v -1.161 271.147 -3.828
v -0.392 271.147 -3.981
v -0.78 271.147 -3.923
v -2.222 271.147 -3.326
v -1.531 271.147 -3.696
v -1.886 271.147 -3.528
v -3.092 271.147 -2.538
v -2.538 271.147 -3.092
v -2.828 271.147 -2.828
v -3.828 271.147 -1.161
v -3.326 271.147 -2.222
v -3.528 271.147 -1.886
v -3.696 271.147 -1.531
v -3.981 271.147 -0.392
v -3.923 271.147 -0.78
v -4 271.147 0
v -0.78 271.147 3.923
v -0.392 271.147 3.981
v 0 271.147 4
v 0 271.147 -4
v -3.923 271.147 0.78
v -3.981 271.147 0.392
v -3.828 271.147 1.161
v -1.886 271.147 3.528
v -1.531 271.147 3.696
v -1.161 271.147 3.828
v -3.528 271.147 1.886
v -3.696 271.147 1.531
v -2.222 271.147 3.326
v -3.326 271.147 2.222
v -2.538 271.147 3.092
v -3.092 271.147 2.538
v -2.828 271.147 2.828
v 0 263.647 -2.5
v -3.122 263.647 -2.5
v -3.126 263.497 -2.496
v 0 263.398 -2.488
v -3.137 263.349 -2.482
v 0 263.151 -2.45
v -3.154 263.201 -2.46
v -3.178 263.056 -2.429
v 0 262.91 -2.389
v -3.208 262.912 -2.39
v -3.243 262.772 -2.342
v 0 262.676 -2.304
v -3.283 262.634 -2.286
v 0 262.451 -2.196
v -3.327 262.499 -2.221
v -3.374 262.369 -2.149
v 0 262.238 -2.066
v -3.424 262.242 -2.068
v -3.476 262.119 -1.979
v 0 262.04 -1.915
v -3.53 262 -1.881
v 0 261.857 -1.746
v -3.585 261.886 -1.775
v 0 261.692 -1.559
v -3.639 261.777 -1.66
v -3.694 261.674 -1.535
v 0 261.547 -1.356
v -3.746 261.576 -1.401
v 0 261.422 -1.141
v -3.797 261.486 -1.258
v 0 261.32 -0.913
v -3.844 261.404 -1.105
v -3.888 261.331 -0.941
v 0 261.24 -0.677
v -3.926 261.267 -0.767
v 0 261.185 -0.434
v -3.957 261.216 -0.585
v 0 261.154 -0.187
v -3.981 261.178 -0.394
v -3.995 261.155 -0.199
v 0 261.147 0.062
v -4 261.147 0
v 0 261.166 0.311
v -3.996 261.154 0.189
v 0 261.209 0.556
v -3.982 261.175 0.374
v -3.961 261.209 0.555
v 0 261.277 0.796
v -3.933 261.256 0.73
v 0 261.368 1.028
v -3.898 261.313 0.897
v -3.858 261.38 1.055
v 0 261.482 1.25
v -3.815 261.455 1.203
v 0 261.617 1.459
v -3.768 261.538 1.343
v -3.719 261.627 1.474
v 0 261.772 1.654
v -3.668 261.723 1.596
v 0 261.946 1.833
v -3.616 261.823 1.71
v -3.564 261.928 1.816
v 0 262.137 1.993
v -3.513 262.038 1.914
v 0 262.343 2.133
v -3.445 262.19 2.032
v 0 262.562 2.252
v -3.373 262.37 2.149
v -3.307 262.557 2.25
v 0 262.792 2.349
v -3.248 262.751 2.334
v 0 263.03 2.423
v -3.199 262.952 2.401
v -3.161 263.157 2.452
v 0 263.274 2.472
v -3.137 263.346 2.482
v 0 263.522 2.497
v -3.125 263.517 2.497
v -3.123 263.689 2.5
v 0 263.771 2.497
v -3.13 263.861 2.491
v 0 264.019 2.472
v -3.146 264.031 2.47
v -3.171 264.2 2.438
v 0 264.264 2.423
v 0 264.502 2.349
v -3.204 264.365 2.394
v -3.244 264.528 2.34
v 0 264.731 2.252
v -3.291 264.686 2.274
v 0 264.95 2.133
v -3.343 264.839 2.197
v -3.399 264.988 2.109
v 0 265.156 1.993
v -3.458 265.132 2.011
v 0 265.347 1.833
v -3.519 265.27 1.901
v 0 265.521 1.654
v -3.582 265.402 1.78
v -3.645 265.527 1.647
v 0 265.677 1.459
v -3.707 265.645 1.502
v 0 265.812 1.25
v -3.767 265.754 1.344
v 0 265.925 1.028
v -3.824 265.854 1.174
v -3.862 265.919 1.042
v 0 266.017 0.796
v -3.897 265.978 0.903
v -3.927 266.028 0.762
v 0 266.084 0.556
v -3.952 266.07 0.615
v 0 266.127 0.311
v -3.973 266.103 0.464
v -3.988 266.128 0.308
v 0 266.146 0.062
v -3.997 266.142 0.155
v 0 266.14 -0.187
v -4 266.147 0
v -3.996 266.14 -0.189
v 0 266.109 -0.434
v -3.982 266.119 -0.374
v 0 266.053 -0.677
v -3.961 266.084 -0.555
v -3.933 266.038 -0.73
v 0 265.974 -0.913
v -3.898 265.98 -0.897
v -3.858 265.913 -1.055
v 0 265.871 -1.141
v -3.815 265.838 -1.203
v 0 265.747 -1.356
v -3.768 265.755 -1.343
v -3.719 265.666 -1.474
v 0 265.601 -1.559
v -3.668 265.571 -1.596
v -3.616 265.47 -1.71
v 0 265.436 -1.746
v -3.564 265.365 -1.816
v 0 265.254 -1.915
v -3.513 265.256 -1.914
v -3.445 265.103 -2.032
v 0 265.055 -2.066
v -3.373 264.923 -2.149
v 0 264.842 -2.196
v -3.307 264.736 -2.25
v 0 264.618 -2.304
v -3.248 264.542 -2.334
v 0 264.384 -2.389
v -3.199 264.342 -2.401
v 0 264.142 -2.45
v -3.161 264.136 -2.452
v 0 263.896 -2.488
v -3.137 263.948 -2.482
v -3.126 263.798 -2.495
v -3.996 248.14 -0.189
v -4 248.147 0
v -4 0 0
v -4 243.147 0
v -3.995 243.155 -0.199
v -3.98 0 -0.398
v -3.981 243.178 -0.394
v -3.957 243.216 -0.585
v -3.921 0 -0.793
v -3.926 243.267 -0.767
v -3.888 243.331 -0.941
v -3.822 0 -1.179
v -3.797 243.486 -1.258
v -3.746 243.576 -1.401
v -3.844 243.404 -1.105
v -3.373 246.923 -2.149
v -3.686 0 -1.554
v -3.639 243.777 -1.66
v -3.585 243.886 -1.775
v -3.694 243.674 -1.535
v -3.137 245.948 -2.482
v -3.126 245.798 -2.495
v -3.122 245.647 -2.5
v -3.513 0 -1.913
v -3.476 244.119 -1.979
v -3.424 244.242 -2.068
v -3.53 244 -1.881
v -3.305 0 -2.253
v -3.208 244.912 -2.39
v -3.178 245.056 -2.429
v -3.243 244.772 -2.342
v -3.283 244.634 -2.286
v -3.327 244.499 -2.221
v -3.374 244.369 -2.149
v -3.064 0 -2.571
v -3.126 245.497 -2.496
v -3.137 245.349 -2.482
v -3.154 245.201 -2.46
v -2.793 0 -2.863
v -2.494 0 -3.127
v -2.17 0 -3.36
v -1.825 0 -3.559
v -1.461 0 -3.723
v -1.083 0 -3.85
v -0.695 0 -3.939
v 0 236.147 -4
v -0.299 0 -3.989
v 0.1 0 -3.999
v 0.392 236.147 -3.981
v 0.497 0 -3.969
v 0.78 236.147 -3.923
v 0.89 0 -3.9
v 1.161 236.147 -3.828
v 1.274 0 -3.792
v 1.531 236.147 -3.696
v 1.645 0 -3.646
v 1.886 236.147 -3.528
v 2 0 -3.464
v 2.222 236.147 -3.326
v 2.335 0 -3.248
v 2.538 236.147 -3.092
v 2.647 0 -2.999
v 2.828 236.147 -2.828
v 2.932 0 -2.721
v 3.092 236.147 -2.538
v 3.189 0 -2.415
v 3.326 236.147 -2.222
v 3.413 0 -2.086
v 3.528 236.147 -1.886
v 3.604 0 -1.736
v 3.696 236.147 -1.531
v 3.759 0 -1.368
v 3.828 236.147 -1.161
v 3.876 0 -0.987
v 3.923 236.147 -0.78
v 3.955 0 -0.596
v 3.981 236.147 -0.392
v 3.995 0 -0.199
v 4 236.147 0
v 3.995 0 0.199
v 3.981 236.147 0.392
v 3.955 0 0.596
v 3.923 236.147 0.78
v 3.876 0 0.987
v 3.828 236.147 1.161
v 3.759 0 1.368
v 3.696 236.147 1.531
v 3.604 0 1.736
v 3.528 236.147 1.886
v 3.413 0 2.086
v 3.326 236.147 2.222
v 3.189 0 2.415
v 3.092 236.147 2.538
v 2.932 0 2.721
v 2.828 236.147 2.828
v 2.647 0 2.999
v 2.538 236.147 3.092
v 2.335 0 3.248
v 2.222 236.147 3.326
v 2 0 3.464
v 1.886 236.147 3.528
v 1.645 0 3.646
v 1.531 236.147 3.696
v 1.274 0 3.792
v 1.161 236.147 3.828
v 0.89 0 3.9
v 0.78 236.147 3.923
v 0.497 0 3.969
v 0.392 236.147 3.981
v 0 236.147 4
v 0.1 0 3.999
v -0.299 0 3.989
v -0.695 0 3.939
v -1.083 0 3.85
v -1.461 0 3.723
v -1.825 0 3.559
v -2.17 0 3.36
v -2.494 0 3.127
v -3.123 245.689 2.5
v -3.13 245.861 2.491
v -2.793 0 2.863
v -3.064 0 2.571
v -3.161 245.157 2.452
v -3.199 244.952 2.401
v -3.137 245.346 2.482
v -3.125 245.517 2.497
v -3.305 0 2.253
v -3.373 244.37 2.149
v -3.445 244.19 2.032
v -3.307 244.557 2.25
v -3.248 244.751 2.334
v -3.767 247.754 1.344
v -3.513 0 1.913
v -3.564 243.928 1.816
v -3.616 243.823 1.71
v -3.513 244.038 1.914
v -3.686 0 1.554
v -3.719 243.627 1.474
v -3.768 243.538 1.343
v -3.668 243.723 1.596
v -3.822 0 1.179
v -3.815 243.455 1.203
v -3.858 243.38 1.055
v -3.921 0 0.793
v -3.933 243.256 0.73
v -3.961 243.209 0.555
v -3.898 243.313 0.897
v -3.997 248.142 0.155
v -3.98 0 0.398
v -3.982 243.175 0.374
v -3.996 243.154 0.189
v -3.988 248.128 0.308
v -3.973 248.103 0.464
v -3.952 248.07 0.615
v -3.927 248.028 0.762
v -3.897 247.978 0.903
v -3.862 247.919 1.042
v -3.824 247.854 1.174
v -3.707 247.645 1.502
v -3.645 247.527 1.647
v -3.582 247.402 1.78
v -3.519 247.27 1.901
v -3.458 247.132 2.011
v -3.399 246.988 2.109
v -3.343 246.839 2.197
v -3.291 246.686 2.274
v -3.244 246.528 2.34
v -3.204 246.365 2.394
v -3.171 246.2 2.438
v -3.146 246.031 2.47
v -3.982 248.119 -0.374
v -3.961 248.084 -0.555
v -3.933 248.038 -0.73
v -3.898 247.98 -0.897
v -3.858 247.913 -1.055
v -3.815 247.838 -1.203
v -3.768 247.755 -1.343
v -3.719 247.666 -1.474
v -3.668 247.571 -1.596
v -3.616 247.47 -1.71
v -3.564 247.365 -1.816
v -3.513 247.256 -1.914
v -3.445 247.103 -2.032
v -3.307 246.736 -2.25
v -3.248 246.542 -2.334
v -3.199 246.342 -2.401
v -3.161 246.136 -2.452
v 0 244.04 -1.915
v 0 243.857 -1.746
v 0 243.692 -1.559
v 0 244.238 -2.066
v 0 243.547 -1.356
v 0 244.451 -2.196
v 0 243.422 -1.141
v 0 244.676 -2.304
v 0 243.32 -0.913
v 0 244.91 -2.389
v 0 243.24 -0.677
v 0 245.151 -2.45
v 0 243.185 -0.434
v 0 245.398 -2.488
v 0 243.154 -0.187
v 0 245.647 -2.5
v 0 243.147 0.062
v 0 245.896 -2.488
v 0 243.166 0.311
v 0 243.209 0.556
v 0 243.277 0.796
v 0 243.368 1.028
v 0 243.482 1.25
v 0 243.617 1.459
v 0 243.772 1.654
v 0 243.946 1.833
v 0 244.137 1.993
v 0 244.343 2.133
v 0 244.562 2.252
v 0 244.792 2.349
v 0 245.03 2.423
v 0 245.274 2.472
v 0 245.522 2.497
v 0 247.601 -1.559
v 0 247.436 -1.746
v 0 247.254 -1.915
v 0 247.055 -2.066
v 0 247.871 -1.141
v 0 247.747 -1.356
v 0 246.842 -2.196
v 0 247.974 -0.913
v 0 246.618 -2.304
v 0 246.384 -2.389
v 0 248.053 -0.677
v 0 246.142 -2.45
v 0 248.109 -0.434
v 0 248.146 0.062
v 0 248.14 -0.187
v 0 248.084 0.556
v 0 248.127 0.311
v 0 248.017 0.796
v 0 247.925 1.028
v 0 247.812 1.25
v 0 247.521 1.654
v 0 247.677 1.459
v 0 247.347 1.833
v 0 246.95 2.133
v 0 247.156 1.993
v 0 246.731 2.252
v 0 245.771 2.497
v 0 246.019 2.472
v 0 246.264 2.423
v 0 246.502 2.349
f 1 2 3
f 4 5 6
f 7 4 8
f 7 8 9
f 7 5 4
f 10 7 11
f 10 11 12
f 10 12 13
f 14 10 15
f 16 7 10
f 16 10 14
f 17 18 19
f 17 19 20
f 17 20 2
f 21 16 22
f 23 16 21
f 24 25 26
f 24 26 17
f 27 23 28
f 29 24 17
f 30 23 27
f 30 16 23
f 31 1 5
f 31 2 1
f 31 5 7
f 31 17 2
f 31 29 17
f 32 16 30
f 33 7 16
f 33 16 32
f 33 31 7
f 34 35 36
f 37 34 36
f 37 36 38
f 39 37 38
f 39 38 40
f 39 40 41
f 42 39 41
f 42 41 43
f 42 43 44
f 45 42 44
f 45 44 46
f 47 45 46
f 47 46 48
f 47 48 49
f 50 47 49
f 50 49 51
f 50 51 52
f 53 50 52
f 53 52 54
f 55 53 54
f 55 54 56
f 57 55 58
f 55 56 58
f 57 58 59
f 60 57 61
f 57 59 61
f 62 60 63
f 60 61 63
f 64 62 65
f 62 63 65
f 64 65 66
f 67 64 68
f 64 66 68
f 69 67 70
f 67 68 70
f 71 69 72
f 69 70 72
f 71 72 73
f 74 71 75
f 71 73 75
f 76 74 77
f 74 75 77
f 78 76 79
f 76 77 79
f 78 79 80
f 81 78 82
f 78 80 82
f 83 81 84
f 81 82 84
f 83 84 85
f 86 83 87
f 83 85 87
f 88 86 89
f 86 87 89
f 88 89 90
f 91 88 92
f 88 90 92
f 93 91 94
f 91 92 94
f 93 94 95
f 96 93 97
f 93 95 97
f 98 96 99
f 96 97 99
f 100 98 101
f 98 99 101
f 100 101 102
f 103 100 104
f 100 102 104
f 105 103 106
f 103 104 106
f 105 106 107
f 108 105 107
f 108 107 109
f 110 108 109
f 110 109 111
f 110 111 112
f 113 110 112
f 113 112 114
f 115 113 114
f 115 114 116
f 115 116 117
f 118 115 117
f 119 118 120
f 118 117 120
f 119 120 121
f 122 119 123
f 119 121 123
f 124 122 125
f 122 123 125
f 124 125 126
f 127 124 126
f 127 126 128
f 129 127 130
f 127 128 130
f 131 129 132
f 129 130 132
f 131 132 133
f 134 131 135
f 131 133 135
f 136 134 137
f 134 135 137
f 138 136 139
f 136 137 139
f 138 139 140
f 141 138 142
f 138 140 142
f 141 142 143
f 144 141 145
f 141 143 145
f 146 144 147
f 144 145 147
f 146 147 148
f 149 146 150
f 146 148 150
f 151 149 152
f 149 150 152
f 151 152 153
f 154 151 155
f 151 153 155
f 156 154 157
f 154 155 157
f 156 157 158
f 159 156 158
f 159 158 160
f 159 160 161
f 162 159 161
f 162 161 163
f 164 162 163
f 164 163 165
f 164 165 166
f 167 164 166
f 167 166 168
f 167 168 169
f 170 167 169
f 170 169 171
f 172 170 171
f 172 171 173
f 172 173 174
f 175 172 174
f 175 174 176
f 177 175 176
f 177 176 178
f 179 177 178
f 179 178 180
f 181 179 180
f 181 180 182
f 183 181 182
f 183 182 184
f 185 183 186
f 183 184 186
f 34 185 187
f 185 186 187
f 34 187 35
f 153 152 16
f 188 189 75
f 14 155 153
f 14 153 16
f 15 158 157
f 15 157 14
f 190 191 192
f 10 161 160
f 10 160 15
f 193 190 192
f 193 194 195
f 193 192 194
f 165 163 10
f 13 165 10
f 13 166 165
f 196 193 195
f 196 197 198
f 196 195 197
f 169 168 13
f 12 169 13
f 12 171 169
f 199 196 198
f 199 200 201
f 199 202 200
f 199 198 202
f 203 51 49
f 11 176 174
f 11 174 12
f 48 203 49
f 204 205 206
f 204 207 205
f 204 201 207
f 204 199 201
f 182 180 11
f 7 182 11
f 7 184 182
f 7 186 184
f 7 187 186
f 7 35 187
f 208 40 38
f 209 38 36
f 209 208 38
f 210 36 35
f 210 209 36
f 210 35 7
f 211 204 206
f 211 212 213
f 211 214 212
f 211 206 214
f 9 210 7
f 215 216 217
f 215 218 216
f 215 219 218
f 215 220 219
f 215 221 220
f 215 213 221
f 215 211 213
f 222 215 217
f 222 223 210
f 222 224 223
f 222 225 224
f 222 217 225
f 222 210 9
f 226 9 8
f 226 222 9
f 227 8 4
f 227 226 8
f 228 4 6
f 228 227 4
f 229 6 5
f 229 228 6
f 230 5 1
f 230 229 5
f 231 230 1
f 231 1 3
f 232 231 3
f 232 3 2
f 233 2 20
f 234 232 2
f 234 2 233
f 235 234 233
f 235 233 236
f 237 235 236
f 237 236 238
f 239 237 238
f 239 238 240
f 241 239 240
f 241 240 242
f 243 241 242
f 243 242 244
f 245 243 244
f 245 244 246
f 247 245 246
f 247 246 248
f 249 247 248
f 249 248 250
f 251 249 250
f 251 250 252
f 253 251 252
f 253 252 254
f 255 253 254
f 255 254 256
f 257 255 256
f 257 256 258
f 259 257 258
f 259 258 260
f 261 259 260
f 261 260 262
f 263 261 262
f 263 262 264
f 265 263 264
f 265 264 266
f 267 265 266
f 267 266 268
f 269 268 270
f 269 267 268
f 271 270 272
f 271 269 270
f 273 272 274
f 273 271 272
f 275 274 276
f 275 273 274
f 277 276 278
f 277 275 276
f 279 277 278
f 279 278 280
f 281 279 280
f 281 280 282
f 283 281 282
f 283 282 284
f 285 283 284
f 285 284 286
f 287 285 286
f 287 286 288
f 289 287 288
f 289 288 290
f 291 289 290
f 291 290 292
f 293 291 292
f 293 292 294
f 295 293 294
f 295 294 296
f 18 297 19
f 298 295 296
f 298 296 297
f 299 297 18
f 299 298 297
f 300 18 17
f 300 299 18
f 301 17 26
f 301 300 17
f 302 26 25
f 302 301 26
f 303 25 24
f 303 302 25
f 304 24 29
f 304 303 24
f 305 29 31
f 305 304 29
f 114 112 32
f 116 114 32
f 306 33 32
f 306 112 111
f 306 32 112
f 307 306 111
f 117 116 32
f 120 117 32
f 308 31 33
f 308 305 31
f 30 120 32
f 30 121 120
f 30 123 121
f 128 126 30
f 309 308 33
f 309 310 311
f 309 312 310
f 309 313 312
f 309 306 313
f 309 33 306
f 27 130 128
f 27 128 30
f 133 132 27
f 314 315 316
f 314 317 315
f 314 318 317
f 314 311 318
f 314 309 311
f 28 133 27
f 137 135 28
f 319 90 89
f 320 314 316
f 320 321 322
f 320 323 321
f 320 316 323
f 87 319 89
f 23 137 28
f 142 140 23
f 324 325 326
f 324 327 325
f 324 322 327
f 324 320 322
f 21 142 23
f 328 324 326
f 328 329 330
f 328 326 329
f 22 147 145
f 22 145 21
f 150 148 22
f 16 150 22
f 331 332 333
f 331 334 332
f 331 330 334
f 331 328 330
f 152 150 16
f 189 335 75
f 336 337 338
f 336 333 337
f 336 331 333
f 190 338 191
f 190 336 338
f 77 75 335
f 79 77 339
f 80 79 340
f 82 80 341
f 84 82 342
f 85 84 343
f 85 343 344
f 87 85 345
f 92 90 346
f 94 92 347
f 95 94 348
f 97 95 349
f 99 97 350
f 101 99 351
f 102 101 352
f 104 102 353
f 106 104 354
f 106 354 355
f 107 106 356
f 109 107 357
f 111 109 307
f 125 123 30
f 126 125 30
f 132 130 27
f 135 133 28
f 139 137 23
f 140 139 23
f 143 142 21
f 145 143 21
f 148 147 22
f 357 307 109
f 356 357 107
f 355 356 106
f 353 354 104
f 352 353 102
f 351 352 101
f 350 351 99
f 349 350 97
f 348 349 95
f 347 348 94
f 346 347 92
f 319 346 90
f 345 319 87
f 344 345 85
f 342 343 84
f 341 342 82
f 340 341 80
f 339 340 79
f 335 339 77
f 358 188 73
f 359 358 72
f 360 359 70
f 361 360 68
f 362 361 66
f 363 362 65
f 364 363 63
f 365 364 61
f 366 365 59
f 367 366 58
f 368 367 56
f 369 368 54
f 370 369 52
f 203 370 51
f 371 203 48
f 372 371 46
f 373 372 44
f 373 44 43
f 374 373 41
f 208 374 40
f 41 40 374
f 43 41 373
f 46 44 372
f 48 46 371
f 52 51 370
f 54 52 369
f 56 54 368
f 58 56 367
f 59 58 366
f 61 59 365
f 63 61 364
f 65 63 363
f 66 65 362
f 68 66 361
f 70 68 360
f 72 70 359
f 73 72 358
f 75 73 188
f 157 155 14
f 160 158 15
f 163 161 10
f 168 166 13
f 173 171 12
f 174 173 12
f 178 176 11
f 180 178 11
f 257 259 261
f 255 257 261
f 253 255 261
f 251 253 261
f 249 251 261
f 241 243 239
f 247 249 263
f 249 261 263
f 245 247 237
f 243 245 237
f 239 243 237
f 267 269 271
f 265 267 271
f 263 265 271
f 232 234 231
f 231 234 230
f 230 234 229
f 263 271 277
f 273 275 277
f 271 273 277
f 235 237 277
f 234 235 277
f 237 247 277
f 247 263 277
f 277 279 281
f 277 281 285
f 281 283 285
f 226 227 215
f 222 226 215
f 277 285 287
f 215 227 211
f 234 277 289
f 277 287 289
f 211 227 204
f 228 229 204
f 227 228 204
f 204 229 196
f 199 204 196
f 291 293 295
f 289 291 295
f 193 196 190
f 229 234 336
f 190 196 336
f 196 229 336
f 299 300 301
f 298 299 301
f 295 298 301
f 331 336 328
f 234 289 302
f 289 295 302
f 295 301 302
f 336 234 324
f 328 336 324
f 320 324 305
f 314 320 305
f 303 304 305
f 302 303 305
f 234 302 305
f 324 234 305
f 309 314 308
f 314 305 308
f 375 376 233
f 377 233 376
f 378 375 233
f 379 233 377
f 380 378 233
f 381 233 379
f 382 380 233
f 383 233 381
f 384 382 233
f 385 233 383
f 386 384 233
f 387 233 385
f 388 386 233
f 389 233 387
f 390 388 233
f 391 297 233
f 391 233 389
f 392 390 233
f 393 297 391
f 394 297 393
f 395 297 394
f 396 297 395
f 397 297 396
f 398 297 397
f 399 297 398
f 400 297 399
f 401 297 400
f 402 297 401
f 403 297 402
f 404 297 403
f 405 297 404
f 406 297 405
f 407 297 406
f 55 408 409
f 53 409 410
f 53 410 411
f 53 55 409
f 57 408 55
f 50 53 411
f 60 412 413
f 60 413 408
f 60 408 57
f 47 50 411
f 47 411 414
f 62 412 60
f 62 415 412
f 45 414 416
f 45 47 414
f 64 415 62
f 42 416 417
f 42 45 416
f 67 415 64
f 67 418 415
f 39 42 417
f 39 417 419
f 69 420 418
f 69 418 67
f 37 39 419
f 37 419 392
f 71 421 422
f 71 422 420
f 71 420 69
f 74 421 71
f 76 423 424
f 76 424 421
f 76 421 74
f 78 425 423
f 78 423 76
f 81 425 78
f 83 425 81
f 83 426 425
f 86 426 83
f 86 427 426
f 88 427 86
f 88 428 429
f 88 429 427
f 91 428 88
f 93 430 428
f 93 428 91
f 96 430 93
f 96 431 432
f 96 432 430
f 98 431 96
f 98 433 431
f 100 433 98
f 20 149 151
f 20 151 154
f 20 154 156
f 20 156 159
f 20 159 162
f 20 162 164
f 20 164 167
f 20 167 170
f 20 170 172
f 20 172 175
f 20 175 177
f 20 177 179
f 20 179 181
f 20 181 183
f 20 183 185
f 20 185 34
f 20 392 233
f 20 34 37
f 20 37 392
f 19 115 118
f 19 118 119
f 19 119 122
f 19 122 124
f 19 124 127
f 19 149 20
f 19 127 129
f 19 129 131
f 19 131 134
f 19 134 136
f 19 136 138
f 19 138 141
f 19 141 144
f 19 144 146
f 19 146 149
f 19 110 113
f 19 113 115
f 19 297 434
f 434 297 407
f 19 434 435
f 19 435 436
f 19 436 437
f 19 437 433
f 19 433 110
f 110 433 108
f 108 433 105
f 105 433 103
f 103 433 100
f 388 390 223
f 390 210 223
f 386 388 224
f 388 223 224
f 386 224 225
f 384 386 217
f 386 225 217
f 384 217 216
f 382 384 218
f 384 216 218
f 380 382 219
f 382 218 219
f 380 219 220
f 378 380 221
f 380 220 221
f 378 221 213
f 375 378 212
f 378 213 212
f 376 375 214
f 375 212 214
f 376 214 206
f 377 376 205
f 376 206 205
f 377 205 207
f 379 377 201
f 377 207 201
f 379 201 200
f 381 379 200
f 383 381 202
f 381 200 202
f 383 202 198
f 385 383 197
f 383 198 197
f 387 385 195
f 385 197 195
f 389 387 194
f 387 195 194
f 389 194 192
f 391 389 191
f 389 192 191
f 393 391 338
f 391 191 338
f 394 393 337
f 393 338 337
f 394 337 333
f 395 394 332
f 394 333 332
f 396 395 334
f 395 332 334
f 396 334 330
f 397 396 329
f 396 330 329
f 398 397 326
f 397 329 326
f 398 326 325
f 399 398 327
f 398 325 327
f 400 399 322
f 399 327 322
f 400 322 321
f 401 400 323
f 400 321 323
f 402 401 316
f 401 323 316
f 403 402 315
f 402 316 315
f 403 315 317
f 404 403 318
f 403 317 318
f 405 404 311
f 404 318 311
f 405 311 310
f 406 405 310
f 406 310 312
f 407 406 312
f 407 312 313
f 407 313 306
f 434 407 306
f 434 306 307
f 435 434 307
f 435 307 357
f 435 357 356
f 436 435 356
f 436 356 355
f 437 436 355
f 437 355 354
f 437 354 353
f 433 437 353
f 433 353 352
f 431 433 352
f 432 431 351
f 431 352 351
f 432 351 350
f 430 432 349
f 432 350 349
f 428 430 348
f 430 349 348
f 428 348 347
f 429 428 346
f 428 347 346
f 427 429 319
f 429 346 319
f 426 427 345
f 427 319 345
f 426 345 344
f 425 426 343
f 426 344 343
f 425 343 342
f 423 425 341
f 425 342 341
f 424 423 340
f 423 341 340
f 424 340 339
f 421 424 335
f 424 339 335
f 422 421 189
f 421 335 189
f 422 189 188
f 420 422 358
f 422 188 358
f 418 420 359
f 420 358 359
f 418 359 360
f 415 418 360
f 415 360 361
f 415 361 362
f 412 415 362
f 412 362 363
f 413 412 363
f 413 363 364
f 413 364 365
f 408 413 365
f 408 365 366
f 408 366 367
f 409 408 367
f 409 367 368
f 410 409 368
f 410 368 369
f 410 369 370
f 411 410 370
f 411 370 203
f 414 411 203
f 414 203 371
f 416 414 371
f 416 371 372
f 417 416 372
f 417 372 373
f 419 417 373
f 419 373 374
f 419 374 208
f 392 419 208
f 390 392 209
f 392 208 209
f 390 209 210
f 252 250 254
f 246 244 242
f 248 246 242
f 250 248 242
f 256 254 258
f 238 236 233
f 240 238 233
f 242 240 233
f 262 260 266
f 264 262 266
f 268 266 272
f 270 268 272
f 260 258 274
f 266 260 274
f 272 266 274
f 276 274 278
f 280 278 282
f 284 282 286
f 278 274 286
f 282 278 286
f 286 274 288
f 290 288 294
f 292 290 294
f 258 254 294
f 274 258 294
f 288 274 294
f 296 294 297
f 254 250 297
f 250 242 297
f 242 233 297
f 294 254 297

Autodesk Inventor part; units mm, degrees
ref_plane "YZ Plane" through (0, 0, 0) normal (1, 0, 0) x (0, 1, 0)
ref_plane "XZ Plane" through (0, 0, 0) normal (0, 1, 0) x (-1, 0, 0)
ref_plane "XY Plane" through (0, 0, 0) normal (0, 0, 1) x (1, 0, 0)
sketch "Sketch1" plane through (0, 0, 0) normal (0, 1, 0) x (-1, 0, 0)
  circle A0 centre (0, 0) radius 4
  dimension "d0" = 8
extrude "Extrusion1" add sketch "Sketch1" along normal blind 271.1467
sketch "Sketch2" plane through (0, 0, 0) normal (1, 0, 0) x (0, 1, 0)
  line L0 (-54.2293, 0) -> (325.3761, 0) projected
  line L1 (271.1467, -4) -> (271.1467, 4) projected
  line L2 (0, 4) -> (271.1467, 4) projected
  line L3 (271.1467, -4) -> (236.1467, -4)
  line L4 (236.1467, -4) -> (236.1467, 4)
  line L5 (236.1467, 4) -> (271.1467, 4)
  line L6 (271.1467, 4) -> (271.1467, -4)
  point P0 (0, 0)
  point P1 (263.6467, 0)
  point P2 (245.6467, 0)
  dimension "d4" = 7.5
  dimension "d5" = 18
  dimension "d6" = 35
extrude "Extrusion2" cut sketch "Sketch2" along normal blind 5
hole "Hole1" at (0, 263.6467, 0) at (0, 245.6467, 0) direction (-1, 0, 0) diameter 5 end through all
properties part number "bar" material "Stainless Steel"
